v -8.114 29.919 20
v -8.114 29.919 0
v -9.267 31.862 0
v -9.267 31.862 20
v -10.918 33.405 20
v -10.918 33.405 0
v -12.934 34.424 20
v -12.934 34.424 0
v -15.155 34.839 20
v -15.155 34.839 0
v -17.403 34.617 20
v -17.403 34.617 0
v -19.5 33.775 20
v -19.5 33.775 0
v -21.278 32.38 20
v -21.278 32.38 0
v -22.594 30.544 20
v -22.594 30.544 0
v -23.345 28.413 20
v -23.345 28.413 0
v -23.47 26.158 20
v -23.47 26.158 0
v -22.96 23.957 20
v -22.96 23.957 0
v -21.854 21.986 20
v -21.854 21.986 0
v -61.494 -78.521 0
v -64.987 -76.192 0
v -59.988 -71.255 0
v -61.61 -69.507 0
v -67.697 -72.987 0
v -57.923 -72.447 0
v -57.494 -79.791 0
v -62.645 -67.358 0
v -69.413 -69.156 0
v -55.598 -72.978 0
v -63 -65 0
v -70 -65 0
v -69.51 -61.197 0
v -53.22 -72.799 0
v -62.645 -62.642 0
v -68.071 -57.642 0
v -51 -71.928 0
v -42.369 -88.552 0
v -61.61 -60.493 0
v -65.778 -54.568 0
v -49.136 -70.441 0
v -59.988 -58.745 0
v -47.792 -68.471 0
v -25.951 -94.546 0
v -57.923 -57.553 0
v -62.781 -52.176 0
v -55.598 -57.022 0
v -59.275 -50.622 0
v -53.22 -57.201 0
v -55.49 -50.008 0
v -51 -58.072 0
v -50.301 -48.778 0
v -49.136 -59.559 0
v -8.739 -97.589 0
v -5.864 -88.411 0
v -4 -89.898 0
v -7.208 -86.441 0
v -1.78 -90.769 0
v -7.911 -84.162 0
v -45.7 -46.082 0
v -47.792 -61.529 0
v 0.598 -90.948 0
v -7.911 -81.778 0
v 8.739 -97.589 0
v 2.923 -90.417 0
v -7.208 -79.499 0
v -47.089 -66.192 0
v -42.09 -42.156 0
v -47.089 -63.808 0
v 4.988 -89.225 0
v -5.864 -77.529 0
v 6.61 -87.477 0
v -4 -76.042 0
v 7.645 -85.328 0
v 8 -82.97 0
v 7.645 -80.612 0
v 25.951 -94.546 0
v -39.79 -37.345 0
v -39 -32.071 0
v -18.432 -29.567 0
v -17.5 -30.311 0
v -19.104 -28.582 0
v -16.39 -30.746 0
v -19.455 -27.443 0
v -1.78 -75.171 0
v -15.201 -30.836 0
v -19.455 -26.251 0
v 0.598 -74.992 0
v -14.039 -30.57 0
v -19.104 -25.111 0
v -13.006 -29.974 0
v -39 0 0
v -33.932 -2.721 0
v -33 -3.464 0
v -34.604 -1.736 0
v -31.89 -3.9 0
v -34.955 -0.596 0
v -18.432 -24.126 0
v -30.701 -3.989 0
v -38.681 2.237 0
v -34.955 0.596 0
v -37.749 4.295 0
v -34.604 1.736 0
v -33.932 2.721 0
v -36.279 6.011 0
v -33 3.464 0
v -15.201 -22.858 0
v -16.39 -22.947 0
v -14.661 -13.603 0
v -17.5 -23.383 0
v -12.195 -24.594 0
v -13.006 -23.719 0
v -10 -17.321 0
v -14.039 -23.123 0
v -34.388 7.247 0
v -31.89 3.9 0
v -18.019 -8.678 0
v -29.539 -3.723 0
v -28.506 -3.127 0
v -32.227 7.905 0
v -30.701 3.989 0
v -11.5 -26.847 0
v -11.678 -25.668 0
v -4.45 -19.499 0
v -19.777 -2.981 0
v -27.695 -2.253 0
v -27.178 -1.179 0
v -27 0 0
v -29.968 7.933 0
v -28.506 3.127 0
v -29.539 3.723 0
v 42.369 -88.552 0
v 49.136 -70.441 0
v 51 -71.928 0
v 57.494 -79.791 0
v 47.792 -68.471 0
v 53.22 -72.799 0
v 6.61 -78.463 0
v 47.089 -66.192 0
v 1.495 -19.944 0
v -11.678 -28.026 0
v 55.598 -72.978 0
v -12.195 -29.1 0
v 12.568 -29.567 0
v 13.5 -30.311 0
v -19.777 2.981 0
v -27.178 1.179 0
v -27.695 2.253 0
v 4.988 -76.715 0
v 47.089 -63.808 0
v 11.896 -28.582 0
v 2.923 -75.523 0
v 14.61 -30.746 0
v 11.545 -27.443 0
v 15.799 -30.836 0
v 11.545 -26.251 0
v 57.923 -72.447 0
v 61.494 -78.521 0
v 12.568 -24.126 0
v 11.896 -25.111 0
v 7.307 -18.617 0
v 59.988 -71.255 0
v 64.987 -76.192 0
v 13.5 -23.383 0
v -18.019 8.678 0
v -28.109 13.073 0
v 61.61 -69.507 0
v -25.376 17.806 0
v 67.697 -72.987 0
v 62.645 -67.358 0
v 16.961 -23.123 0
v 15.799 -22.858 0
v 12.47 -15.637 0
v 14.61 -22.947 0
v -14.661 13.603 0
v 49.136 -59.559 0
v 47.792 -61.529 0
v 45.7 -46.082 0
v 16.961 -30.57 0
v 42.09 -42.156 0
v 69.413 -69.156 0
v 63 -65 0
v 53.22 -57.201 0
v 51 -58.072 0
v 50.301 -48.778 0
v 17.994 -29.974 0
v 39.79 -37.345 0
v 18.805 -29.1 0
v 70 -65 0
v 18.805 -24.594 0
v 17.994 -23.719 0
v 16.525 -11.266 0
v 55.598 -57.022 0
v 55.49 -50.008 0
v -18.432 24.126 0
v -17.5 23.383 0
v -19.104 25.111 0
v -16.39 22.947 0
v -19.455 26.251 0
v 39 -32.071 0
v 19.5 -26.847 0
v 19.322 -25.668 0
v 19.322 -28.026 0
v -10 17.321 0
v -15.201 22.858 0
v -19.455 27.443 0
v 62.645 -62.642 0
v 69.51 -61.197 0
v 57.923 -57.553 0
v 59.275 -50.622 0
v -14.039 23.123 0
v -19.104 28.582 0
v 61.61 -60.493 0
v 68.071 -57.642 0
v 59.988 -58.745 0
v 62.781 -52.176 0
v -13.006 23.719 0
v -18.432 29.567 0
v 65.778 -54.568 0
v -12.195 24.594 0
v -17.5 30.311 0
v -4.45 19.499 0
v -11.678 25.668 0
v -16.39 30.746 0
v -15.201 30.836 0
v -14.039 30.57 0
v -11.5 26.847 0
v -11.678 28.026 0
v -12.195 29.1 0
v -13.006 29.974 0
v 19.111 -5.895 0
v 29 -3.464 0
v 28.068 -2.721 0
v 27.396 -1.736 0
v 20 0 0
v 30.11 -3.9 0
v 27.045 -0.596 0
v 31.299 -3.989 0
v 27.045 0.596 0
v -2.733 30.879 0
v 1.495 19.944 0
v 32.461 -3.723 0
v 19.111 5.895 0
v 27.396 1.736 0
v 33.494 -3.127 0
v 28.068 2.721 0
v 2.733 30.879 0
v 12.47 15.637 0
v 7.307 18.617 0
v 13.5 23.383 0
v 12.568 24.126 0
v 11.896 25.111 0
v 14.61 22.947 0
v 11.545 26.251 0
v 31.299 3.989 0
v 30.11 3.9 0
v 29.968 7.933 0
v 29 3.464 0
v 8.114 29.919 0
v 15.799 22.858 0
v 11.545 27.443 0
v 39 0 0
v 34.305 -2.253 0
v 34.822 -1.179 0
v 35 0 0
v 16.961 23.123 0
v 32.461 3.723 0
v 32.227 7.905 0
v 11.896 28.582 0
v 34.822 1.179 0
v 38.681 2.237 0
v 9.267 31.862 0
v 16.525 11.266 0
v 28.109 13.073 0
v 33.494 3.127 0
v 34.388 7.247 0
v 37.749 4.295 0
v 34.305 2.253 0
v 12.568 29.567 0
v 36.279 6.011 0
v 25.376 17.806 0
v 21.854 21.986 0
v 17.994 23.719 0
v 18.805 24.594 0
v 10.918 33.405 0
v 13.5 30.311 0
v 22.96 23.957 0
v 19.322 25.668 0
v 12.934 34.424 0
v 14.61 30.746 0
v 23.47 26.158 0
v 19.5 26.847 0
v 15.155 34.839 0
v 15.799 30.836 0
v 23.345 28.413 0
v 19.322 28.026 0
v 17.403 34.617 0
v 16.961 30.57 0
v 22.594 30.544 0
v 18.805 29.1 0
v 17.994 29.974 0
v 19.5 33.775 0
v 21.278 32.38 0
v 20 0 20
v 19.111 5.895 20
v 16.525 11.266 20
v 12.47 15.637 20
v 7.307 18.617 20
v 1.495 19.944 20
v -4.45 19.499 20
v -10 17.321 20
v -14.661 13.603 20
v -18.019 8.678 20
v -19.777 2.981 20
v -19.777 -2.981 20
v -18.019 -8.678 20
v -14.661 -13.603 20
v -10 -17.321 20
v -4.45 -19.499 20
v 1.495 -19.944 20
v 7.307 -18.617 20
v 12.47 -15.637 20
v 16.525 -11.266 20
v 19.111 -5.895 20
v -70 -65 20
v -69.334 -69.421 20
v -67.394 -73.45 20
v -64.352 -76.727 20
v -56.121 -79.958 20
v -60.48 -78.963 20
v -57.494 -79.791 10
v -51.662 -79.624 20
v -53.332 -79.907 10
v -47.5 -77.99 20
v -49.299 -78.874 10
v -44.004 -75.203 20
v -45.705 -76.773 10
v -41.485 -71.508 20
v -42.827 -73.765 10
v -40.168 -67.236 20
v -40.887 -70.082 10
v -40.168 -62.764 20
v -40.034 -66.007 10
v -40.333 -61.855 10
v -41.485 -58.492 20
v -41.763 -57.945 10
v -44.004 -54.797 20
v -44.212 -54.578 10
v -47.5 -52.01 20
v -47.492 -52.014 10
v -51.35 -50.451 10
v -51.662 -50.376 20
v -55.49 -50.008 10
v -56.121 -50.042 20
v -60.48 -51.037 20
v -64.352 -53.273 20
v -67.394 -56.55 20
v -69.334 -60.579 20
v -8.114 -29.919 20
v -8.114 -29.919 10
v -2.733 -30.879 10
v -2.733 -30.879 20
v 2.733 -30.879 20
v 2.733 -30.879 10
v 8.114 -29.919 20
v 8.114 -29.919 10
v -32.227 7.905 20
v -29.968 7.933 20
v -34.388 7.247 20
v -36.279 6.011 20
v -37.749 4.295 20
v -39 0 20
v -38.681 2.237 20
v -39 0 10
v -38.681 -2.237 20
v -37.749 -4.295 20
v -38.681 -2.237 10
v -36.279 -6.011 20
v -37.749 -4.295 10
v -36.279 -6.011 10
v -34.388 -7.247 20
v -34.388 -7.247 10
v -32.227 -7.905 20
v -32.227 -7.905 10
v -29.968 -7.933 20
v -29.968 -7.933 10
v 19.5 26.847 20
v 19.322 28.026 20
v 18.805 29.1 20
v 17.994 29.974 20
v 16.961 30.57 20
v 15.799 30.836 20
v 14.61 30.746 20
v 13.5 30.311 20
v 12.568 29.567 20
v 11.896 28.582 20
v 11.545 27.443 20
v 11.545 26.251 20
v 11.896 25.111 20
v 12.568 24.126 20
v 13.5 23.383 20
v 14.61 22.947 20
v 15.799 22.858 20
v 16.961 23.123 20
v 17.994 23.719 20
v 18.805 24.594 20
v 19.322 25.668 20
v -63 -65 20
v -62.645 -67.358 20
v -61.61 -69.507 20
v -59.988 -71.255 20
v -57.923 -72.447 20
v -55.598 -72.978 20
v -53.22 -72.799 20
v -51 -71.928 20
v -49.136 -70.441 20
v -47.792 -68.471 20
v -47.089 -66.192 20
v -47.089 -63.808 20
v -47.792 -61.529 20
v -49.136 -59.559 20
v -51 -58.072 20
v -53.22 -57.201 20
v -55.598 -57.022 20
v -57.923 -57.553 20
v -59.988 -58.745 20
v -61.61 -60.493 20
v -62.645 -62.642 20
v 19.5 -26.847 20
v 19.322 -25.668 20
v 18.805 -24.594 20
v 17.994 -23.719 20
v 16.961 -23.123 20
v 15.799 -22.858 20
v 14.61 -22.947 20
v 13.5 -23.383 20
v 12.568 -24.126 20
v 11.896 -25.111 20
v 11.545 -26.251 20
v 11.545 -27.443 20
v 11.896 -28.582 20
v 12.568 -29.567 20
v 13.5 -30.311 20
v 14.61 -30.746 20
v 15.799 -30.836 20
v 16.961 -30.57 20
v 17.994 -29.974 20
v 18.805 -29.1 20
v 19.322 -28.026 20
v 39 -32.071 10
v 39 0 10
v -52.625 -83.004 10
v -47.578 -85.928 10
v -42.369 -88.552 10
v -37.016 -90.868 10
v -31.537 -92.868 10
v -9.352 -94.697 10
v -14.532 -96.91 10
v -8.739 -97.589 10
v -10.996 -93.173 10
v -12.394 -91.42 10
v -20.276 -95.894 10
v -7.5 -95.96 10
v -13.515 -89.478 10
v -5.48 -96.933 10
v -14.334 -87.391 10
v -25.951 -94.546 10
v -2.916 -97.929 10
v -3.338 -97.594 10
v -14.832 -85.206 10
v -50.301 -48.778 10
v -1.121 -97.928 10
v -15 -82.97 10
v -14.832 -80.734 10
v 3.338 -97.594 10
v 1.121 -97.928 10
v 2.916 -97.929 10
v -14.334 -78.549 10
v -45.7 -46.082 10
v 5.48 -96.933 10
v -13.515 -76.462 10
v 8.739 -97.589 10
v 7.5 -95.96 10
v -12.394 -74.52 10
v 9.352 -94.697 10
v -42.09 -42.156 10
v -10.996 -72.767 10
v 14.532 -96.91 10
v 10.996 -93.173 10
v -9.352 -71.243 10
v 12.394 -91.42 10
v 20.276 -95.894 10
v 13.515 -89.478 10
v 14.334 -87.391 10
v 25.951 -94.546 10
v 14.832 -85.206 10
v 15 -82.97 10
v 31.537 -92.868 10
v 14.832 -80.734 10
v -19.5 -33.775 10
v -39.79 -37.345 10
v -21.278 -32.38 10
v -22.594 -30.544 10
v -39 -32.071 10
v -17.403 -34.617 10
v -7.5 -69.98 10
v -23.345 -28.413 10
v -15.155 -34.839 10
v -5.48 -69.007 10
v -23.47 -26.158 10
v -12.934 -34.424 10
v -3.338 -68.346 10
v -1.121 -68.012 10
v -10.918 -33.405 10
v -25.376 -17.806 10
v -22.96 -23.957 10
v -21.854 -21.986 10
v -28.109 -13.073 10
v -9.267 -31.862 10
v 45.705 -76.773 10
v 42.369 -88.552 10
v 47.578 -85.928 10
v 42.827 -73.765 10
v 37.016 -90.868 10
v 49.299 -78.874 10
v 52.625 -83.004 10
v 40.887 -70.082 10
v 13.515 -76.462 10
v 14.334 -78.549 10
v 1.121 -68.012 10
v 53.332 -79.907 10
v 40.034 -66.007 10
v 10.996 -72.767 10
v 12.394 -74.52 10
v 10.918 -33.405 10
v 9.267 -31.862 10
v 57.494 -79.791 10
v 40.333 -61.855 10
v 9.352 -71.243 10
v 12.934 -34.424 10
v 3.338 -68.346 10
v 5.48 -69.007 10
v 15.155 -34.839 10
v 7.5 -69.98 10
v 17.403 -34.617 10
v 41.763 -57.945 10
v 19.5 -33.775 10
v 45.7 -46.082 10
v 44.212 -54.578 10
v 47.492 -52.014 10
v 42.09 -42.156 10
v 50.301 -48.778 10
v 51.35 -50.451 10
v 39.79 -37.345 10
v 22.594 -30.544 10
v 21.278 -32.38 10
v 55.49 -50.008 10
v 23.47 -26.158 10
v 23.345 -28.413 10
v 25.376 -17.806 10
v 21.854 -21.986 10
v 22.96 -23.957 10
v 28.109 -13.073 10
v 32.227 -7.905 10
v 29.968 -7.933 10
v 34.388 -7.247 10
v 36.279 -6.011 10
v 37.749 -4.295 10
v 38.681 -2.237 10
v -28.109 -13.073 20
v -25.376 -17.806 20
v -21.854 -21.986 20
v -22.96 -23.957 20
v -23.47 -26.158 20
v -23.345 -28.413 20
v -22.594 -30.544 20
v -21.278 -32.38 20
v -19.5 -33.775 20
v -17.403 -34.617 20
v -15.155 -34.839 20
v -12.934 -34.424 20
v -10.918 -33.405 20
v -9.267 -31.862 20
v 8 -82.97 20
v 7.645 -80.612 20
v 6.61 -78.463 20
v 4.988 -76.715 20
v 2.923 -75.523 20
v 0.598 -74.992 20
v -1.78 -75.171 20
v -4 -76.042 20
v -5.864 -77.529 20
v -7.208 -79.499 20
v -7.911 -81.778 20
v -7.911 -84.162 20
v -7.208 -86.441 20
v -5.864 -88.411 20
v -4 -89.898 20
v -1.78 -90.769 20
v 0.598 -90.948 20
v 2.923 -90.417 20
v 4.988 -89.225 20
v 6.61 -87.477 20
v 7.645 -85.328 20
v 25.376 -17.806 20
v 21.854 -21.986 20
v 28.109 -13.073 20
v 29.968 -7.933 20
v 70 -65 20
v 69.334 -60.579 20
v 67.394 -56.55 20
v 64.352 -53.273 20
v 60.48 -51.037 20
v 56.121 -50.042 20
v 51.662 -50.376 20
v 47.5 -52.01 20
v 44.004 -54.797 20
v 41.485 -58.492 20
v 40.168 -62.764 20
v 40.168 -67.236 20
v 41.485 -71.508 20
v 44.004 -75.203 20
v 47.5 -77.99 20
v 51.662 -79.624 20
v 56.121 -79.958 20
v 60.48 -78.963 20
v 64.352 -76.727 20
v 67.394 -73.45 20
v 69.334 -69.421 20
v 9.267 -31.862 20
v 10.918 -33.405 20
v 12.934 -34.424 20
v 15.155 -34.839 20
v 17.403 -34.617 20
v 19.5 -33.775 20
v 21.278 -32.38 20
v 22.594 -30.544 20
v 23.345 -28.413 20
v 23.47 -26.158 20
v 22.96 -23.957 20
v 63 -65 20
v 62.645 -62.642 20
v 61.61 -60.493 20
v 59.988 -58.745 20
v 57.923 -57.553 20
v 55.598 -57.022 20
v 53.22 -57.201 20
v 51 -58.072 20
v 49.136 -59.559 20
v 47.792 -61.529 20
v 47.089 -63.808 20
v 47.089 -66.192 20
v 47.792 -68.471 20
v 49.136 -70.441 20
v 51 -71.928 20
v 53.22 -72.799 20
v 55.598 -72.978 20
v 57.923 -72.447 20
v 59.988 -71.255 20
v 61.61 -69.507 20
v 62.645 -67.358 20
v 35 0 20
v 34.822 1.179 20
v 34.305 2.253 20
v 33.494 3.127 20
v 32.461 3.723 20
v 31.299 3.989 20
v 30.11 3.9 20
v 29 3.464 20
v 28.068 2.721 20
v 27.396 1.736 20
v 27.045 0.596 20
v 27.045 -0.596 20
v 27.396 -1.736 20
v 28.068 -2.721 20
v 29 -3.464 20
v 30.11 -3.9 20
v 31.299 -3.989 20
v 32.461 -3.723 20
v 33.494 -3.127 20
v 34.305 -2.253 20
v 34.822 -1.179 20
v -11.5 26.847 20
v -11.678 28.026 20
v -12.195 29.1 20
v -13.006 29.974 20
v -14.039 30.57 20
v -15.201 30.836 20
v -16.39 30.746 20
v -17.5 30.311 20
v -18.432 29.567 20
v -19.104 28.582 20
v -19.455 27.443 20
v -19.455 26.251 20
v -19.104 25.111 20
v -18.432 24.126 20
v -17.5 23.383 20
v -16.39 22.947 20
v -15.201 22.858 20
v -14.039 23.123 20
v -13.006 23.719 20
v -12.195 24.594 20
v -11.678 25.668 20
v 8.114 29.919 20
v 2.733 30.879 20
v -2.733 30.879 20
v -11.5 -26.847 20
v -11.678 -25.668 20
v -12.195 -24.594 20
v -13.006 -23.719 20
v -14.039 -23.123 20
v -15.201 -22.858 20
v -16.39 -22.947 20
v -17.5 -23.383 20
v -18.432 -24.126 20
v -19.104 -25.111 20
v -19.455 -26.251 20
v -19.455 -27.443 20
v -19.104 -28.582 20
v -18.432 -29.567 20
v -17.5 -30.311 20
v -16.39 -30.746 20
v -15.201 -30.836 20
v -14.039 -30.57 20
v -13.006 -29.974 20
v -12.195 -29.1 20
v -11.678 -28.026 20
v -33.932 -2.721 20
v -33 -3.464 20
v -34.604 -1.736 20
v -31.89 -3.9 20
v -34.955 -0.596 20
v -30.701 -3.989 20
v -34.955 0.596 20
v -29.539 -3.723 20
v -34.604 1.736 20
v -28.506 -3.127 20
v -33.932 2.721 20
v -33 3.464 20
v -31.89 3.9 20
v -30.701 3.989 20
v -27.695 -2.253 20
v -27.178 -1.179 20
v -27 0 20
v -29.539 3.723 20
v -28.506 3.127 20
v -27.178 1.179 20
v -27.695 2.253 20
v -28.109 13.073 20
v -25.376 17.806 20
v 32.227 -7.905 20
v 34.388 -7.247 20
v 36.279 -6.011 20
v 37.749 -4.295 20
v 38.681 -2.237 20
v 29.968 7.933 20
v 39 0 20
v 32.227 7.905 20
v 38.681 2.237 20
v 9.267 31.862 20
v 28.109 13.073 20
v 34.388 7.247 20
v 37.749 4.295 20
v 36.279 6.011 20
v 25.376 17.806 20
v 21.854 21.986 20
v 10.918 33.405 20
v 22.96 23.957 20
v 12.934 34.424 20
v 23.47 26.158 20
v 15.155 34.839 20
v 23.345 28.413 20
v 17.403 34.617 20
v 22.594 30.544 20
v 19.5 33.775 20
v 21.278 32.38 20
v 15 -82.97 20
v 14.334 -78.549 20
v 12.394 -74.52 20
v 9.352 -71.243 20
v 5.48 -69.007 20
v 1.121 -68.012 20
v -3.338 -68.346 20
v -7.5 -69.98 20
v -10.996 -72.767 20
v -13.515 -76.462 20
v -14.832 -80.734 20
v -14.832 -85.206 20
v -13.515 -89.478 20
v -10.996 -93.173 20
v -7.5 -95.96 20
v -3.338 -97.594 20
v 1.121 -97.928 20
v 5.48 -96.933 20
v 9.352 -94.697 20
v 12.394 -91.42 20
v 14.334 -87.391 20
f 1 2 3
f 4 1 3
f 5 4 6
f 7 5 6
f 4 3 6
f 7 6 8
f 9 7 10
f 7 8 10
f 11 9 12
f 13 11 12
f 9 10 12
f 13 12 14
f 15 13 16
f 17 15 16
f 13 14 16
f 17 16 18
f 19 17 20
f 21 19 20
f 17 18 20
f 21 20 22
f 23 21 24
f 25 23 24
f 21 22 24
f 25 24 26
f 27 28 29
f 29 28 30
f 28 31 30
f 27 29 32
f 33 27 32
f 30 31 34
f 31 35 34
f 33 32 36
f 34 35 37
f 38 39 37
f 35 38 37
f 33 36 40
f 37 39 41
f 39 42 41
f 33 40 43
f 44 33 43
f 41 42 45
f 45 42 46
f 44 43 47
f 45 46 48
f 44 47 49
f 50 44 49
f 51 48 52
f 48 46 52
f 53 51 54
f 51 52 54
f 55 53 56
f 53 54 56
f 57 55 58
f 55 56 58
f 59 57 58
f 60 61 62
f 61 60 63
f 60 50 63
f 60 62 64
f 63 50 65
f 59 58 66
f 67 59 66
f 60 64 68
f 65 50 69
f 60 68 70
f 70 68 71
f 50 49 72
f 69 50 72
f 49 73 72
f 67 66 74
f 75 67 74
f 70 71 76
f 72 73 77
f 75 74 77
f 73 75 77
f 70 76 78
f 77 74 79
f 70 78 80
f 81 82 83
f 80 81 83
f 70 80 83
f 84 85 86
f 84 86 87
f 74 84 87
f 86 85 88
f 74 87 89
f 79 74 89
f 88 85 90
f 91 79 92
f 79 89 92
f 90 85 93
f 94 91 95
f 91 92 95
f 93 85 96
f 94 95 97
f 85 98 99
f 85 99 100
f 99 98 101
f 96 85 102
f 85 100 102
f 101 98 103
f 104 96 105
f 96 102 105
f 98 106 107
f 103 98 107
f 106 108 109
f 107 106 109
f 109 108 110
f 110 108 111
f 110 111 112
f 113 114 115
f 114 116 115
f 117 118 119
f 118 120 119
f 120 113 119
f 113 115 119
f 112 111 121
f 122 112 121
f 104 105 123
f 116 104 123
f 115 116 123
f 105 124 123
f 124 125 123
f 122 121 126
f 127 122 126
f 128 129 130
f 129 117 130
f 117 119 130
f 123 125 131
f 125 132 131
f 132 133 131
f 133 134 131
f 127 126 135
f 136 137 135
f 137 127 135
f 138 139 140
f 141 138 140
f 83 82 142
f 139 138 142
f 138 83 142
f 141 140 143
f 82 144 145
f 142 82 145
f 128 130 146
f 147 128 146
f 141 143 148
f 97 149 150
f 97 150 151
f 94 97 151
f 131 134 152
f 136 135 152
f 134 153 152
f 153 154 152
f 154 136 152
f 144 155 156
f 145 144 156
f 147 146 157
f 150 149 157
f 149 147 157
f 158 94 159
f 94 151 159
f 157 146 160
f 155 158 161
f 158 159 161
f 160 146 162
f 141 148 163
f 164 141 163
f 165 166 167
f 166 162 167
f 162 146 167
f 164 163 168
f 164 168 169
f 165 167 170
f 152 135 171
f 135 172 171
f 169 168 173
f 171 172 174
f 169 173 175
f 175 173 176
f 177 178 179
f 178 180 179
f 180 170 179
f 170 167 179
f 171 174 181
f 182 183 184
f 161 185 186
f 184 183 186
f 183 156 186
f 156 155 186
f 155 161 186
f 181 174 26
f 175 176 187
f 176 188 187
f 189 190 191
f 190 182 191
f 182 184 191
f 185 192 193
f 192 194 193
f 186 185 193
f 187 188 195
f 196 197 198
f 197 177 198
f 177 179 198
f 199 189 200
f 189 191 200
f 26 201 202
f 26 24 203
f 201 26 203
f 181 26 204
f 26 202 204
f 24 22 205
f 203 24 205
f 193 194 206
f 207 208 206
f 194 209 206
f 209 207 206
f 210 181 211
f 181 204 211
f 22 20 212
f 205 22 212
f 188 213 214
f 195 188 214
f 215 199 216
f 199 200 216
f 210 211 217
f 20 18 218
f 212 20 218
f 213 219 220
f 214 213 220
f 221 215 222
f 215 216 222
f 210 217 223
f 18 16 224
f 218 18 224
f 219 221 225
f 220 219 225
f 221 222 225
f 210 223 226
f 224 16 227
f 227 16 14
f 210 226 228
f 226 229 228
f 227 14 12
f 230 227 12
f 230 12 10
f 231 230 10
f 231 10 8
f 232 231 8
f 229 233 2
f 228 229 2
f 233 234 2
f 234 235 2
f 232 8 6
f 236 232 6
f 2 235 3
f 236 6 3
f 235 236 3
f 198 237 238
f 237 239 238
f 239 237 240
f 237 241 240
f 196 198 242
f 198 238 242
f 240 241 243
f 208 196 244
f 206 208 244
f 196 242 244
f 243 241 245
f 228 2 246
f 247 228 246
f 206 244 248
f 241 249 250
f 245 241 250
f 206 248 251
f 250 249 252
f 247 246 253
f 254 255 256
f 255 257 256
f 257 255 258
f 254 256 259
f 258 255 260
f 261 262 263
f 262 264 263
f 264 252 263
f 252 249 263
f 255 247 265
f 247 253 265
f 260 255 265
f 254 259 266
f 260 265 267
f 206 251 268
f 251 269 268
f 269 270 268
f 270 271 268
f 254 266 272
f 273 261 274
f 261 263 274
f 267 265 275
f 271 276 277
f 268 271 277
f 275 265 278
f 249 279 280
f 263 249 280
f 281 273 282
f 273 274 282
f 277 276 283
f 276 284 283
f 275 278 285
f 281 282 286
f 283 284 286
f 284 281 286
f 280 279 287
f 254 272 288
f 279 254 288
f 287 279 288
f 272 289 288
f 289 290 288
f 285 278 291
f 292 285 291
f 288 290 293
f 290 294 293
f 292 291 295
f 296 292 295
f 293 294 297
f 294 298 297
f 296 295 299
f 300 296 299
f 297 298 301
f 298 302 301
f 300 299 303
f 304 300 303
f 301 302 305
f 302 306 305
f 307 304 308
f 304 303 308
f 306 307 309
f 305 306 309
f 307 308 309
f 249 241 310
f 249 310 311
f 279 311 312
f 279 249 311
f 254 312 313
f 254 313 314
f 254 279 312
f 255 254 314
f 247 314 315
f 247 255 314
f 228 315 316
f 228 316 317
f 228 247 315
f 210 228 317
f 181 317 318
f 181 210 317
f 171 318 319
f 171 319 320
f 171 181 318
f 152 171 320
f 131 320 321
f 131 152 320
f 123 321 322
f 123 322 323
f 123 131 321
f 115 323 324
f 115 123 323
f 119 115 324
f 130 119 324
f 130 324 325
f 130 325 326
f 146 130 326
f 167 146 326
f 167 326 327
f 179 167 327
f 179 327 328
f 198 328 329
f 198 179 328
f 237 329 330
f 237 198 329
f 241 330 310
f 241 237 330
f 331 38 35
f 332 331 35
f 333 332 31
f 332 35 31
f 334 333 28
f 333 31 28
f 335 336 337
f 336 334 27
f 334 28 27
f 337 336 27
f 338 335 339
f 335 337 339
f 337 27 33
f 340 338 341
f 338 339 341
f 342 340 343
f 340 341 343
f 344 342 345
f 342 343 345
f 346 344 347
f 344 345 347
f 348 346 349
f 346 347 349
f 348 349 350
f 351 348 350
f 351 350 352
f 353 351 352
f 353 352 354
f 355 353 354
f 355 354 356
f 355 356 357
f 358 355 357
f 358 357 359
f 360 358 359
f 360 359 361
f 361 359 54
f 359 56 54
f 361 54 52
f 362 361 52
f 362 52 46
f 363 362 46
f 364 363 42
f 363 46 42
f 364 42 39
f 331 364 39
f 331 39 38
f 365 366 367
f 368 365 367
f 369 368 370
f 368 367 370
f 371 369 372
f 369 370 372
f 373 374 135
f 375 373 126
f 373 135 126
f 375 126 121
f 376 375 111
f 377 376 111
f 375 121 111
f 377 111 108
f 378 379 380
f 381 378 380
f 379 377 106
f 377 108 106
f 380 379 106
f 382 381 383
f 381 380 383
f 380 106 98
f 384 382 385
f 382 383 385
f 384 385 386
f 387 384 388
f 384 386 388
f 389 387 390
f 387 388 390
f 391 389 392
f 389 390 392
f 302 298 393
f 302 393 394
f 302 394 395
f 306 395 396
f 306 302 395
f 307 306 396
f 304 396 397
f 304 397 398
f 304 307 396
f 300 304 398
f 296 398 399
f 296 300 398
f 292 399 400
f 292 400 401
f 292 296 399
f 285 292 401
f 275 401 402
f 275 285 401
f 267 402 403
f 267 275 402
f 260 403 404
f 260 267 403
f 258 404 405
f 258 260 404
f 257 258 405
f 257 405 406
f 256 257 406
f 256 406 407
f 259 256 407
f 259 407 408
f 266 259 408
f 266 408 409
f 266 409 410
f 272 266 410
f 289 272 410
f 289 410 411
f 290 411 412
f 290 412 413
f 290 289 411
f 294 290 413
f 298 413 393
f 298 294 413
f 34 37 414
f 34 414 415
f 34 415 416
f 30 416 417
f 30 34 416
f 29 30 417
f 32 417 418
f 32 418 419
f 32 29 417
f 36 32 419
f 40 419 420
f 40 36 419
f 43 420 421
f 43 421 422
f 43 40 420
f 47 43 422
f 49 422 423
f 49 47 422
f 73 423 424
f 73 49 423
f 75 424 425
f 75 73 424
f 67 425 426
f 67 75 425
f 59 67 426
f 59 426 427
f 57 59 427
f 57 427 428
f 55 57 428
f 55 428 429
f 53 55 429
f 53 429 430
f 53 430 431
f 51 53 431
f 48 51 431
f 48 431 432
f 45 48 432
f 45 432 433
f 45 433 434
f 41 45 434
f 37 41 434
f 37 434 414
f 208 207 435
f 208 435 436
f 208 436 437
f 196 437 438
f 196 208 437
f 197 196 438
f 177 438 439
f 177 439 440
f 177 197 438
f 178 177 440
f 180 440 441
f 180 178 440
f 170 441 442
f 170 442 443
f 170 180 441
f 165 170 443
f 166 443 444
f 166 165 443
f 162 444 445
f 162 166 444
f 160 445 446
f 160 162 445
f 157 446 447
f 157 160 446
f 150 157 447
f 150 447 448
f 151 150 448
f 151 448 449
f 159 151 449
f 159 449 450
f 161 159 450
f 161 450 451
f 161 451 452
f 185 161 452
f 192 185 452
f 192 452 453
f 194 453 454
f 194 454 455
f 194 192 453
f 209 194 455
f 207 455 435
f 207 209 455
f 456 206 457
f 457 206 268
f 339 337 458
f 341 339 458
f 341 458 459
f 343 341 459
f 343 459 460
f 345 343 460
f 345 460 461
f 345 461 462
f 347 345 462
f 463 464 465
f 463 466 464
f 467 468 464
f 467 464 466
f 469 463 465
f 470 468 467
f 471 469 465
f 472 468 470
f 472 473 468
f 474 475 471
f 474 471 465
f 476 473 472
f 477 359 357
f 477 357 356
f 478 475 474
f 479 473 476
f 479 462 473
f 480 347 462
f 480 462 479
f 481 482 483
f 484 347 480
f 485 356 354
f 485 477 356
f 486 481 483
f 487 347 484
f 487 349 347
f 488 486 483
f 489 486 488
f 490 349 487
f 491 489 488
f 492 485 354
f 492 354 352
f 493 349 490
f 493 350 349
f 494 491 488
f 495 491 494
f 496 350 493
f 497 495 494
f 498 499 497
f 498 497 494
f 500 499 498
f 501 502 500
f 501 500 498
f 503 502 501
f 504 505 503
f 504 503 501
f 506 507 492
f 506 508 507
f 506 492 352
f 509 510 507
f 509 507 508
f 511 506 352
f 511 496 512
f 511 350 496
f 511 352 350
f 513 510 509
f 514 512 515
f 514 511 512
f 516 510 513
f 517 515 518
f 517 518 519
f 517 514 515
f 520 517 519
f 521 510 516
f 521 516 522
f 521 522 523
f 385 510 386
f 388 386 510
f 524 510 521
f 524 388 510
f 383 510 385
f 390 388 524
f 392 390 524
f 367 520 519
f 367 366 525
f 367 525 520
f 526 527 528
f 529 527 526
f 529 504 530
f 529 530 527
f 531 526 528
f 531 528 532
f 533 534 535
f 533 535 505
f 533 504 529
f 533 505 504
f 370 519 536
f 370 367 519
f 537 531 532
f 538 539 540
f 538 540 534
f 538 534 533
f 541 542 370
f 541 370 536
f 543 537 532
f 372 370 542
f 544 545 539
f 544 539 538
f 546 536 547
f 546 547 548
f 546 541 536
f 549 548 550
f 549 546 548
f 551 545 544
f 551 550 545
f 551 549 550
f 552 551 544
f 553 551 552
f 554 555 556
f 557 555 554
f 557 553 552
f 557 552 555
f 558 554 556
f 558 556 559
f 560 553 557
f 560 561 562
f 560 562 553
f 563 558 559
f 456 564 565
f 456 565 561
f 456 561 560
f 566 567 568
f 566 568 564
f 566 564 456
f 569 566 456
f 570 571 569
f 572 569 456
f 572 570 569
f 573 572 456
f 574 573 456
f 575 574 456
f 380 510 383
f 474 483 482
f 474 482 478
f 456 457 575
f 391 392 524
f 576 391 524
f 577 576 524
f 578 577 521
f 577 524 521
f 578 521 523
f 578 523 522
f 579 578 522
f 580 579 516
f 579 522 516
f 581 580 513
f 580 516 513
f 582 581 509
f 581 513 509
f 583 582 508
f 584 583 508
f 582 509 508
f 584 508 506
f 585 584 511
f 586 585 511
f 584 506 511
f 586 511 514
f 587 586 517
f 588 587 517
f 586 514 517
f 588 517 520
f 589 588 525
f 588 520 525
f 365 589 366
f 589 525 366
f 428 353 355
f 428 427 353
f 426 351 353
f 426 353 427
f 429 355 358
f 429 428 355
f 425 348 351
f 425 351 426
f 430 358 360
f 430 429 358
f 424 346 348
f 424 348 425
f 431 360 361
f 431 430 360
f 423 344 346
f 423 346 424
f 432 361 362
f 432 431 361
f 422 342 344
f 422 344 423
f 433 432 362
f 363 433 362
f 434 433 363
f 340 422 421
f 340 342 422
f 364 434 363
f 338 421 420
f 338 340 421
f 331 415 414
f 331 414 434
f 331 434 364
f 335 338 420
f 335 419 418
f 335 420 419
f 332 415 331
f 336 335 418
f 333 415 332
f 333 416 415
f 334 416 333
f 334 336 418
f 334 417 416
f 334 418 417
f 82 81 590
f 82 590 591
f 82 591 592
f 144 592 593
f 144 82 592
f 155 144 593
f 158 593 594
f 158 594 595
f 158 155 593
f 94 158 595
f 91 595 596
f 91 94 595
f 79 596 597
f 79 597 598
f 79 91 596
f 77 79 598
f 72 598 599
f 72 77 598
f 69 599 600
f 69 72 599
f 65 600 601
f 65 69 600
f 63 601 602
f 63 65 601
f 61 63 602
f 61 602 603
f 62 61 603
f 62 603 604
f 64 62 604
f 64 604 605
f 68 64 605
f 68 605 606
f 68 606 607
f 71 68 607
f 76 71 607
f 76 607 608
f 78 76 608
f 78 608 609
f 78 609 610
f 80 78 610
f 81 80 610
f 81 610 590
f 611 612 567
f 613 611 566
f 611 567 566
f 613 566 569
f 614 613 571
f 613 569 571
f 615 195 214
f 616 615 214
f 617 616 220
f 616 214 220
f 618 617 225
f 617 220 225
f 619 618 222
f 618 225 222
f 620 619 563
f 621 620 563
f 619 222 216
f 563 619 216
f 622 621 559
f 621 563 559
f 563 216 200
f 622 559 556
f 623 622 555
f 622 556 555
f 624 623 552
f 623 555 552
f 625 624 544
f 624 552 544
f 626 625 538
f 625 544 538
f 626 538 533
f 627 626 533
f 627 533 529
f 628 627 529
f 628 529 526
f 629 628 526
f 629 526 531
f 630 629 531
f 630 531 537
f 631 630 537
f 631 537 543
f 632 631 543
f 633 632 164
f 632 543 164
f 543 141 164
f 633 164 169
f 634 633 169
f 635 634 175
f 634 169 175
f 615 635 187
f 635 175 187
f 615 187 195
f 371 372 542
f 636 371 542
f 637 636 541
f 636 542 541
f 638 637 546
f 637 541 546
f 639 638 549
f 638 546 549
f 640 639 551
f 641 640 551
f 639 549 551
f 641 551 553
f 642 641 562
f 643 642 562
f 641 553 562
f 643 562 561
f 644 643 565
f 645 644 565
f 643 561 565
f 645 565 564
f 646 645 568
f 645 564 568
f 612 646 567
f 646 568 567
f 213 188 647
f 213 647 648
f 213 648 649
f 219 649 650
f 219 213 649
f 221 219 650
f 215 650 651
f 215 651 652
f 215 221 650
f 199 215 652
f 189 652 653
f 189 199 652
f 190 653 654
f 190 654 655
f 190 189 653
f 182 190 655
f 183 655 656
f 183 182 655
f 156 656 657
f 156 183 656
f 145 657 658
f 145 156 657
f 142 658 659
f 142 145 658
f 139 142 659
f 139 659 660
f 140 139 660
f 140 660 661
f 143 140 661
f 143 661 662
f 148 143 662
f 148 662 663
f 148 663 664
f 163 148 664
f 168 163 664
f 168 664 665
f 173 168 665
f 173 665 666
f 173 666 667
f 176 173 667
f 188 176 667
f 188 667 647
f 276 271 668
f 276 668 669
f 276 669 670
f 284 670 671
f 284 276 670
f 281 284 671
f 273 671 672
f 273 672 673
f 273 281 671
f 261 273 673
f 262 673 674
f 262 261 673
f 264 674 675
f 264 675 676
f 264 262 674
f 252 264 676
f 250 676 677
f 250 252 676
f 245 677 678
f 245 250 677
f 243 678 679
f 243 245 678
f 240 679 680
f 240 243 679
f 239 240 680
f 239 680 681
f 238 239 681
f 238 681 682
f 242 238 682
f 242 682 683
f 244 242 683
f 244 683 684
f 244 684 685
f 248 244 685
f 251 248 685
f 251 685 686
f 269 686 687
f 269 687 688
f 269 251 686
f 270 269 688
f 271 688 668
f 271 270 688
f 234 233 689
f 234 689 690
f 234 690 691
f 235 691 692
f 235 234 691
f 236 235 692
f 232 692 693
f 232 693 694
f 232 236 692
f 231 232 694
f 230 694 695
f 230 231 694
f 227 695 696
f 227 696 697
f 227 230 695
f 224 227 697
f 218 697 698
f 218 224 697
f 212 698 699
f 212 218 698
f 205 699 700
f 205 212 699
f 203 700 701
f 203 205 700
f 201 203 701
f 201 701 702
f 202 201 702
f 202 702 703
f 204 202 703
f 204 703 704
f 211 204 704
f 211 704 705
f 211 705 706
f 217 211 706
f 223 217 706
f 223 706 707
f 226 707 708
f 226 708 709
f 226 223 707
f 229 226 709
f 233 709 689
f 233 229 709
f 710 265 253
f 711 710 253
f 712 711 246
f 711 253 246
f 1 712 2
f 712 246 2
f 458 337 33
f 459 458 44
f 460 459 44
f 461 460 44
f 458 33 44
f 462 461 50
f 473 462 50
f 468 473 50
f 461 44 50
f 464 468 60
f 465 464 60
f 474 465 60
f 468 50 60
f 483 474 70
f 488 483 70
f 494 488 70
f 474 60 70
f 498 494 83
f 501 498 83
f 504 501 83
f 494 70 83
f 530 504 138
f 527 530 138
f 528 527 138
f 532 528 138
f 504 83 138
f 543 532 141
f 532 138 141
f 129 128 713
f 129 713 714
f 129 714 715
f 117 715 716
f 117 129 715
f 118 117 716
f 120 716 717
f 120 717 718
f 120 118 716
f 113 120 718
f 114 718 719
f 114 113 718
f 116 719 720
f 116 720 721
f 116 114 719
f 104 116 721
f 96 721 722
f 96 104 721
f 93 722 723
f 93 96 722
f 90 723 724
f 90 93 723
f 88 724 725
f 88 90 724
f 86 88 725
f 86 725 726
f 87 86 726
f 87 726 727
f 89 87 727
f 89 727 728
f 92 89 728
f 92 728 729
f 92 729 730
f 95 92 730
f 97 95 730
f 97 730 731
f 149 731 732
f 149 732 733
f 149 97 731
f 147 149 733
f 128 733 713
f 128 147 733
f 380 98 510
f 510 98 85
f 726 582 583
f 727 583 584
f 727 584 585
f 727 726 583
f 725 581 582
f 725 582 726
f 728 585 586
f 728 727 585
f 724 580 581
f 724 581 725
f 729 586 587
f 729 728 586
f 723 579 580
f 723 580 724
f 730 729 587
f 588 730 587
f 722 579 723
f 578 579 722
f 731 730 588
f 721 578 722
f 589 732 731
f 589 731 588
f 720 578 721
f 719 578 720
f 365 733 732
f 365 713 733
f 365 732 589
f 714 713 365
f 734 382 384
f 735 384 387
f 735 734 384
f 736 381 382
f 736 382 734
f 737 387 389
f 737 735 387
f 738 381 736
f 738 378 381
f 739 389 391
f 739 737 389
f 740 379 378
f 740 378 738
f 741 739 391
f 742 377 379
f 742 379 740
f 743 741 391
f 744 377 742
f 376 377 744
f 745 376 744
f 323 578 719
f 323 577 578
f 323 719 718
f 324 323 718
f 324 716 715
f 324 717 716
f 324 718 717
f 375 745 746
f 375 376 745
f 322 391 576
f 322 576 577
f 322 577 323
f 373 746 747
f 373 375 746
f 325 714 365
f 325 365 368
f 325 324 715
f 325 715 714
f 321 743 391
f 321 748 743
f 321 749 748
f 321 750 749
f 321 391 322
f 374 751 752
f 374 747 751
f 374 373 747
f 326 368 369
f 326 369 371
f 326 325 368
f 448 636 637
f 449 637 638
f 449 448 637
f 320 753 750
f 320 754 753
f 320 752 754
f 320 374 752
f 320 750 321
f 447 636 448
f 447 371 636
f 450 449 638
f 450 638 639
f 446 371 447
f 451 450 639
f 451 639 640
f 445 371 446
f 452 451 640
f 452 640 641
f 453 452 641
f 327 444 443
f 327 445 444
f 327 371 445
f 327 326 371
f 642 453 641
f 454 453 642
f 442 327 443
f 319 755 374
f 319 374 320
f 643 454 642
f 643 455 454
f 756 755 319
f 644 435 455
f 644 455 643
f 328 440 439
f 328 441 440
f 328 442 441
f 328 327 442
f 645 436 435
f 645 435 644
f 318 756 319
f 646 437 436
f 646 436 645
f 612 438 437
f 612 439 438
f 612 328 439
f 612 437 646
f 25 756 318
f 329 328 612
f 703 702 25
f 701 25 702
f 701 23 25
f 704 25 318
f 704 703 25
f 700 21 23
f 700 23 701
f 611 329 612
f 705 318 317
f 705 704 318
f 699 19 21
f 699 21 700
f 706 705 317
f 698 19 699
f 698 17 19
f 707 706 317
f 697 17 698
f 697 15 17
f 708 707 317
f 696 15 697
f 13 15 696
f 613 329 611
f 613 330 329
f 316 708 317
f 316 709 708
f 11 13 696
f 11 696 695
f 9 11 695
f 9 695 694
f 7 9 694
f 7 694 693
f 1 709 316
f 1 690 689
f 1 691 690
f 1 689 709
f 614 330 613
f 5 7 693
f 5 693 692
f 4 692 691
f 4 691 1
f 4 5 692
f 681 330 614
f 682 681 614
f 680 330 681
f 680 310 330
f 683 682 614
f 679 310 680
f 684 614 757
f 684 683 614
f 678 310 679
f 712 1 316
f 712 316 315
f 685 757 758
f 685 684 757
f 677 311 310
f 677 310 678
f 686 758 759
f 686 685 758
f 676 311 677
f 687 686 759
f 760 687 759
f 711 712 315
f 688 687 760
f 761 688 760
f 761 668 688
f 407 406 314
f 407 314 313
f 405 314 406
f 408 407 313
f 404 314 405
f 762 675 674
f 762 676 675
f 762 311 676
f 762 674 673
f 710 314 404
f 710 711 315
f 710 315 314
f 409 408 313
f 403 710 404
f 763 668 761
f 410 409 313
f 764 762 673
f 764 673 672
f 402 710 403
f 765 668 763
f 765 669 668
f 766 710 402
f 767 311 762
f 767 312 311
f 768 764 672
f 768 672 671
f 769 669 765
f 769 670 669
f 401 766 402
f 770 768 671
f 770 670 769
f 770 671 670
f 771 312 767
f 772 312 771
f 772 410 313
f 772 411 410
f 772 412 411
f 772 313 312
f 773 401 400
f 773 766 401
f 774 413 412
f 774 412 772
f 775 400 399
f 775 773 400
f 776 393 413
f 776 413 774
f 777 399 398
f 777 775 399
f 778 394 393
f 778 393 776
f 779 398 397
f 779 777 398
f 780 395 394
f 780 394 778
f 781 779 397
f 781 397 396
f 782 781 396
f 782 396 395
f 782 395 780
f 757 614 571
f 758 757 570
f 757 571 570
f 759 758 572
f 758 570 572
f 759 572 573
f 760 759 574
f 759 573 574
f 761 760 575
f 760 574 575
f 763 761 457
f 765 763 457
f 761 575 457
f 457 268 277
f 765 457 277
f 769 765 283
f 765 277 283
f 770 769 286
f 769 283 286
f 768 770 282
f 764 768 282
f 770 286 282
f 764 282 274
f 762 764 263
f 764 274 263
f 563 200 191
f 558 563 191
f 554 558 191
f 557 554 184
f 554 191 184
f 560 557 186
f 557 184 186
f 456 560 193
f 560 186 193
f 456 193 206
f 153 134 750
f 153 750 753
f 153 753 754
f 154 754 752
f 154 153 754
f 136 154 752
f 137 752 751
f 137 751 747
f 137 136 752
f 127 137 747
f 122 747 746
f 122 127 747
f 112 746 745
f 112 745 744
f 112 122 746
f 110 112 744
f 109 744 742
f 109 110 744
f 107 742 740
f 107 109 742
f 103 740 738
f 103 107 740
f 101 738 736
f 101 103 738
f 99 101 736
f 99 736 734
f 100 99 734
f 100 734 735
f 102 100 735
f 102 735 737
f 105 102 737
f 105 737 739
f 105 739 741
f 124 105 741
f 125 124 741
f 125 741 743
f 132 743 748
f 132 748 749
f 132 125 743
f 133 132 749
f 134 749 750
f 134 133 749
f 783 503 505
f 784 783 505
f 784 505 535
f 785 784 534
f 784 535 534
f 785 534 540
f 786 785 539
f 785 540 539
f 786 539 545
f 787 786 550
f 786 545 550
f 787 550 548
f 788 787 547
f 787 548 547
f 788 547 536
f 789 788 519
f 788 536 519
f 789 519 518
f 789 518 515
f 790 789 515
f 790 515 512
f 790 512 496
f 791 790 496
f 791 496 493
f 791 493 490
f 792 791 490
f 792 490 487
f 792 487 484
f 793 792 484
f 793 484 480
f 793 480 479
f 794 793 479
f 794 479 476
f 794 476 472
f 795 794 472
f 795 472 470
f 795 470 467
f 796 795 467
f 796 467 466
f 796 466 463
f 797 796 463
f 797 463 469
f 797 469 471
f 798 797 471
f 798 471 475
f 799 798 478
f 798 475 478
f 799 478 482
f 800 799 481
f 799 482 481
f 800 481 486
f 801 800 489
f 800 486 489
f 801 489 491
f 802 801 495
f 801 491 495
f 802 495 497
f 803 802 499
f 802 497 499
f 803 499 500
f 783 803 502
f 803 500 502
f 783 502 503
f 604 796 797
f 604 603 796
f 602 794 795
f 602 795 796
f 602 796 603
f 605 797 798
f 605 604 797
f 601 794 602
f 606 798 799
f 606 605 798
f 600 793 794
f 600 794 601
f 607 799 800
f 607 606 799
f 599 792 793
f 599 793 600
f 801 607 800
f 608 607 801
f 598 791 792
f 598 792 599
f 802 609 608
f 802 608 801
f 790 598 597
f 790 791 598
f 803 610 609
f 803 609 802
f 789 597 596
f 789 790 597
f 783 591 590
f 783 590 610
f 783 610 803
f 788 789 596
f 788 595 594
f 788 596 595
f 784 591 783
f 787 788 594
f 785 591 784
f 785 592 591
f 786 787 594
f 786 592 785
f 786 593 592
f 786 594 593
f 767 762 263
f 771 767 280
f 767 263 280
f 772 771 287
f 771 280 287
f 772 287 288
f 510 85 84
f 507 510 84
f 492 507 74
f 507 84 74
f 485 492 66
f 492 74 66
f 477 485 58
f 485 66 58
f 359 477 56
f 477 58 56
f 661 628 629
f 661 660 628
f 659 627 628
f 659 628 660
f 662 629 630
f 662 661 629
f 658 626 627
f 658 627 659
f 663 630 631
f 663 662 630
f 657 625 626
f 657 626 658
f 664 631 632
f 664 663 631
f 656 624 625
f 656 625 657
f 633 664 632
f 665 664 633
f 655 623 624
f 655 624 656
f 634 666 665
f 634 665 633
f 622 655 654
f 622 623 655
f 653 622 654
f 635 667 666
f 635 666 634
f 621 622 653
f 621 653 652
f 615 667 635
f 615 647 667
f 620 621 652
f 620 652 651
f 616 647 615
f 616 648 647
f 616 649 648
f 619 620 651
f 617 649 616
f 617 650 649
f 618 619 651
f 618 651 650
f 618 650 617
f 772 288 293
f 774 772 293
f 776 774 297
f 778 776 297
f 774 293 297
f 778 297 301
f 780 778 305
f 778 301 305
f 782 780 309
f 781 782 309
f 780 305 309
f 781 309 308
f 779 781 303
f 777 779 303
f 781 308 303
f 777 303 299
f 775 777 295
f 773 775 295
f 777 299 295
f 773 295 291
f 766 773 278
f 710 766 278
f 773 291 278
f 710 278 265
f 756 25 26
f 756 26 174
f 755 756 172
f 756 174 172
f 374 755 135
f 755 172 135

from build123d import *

# Parameters (mm, degrees)
CROQUIS1_R                = 15
CROQUIS1_R_2              = 8
SALIENTE_EXTRUIR1_DEPTH   = 20
SALIENTE_EXTRUIR1_2_DEPTH = 20
SALIENTE_EXTRUIR1_3_DEPTH = 20
CROQUIS1_R_3              = 20
CROQUIS1_R_4              = 4
SALIENTE_EXTRUIR1_4_DEPTH = 20
SALIENTE_EXTRUIR2_DEPTH   = 10
CORTAR_EXTRUIR1_START     = -10
CROQUIS3_R                = 8
CORTAR_EXTRUIR1_DEPTH     = 10


with BuildPart() as part:
    # Croquis1 → Saliente-Extruir1 (new body)
    with BuildSketch(Plane.XY):
        with Locations((0, -82.97)):
            Circle(CROQUIS1_R)
        with Locations((0, -82.97)):
            Circle(CROQUIS1_R_2, mode=Mode.SUBTRACT)
    extrude(amount=SALIENTE_EXTRUIR1_DEPTH)



with BuildPart() as body_2:
    # Croquis1 → Saliente-Extruir1 2 (new body)
    with BuildSketch(Plane.XY):
        with Locations((55, -65)):
            Circle(CROQUIS1_R)
        with Locations((55, -65)):
            Circle(CROQUIS1_R_2, mode=Mode.SUBTRACT)
    extrude(amount=SALIENTE_EXTRUIR1_2_DEPTH)


with BuildPart() as body_3:
    # Croquis1 → Saliente-Extruir1 3 (new body)
    with BuildSketch(Plane.XY):
        with Locations(Location((-55, -65, 0), (0, 0, 180))):
            Circle(CROQUIS1_R)
        with Locations(Location((-55, -65, 0), (0, 0, 180))):
            Circle(CROQUIS1_R_2, mode=Mode.SUBTRACT)
    extrude(amount=SALIENTE_EXTRUIR1_3_DEPTH)


with BuildPart() as body_4:
    # Croquis1 → Saliente-Extruir1 4 (new body)
    with BuildSketch(Plane.XY):
        with BuildLine():
            ThreePointArc((-21.854157167, 21.986264223), (-26.846787517, 15.5), (-29.967741935, 7.933123174))
            ThreePointArc((-29.967741935, 7.933123174), (-39, 0), (-29.967741935, -7.933123174))
            ThreePointArc((-29.967741935, -7.933123174), (-26.846787517, -15.5), (-21.854157167, -21.986264223))
            ThreePointArc((-21.854157167, -21.986264223), (-19.5, -33.774990748), (-8.113584768, -29.919387397))
            ThreePointArc((-8.113584768, -29.919387397), (0, -31), (8.113584768, -29.919387397))
            ThreePointArc((8.113584768, -29.919387397), (19.5, -33.774990748), (21.854157167, -21.986264223))
            ThreePointArc((21.854157167, -21.986264223), (26.846787517, -15.5), (29.967741935, -7.933123174))
            ThreePointArc((29.967741935, -7.933123174), (39, 0), (29.967741935, 7.933123174))
            ThreePointArc((29.967741935, 7.933123174), (26.846787517, 15.5), (21.854157167, 21.986264223))
            ThreePointArc((21.854157167, 21.986264223), (19.5, 33.774990748), (8.113584768, 29.919387397))
            ThreePointArc((8.113584768, 29.919387397), (0, 31), (-8.113584768, 29.919387397))
            ThreePointArc((-8.113584768, 29.919387397), (-19.5, 33.774990748), (-21.854157167, 21.986264223))
        make_face()
        Circle(CROQUIS1_R_3, mode=Mode.SUBTRACT)
        with Locations((31, 0)):
            Circle(CROQUIS1_R_4, mode=Mode.SUBTRACT)
        with Locations((15.5, -26.846787517)):
            Circle(CROQUIS1_R_4, mode=Mode.SUBTRACT)
        with Locations((-15.5, -26.846787517)):
            Circle(CROQUIS1_R_4, mode=Mode.SUBTRACT)
        with Locations((-31, 0)):
            Circle(CROQUIS1_R_4, mode=Mode.SUBTRACT)
        with Locations((-15.5, 26.846787517)):
            Circle(CROQUIS1_R_4, mode=Mode.SUBTRACT)
        with Locations((15.5, 26.846787517)):
            Circle(CROQUIS1_R_4, mode=Mode.SUBTRACT)
    extrude(amount=SALIENTE_EXTRUIR1_4_DEPTH)


with BuildPart() as part_1:
    add(part.part)

    add(body_2.part)  # Saliente-Extruir2 merges body 2

    add(body_3.part)  # Saliente-Extruir2 merges body 3

    add(body_4.part)  # Saliente-Extruir2 merges body 4
    # Croquis2 → Saliente-Extruir2 (add)
    with BuildSketch(Plane.XY):
        with BuildLine():
            Line((-39, 0), (-39, -32.071476789))
            ThreePointArc((-39, -32.071476789), (-44.036846437, -44.559737265), (-56.328516633, -50.058947709))
            ThreePointArc((-56.328516633, -50.058947709), (-69.988497958, -64.412693478), (-57.493543192, -79.791289408))
            ThreePointArc((-57.493543192, -79.791289408), (0, -97.97141107), (57.493543192, -79.791289408))
            ThreePointArc((57.493543192, -79.791289408), (69.988497958, -64.412693478), (56.328516633, -50.058947709))
            ThreePointArc((56.328516633, -50.058947709), (44.036846437, -44.559737265), (39, -32.071476789))
            Line((39, -32.071476789), (39, 0))
            ThreePointArc((39, 0), (36.279296141, -6.01074307), (29.967741935, -7.933123174))
            ThreePointArc((29.967741935, -7.933123174), (26.846787517, -15.5), (21.854157167, -21.986264223))
            ThreePointArc((21.854157167, -21.986264223), (19.5, -33.774990748), (8.113584768, -29.919387397))
            ThreePointArc((8.113584768, -29.919387397), (0, -31), (-8.113584768, -29.919387397))
            ThreePointArc((-8.113584768, -29.919387397), (-19.5, -33.774990748), (-21.854157167, -21.986264223))
            ThreePointArc((-21.854157167, -21.986264223), (-26.846787517, -15.5), (-29.967741935, -7.933123174))
            ThreePointArc((-29.967741935, -7.933123174), (-36.27929614, -6.01074307), (-39, 0))
        make_face()
    extrude(amount=SALIENTE_EXTRUIR2_DEPTH)

    # Croquis3 → Cortar-Extruir1 (cut)
    with BuildSketch(Plane.XY.offset(10).offset(CORTAR_EXTRUIR1_START)):
        with Locations(Location((-55, -65, 0), (0, 0, 180))):
            Circle(CROQUIS3_R)
        with Locations((0, -82.97)):
            Circle(CROQUIS3_R)
        with Locations((55, -65)):
            Circle(CROQUIS3_R)
    extrude(amount=CORTAR_EXTRUIR1_DEPTH, mode=Mode.SUBTRACT)


solid = part_1.part
